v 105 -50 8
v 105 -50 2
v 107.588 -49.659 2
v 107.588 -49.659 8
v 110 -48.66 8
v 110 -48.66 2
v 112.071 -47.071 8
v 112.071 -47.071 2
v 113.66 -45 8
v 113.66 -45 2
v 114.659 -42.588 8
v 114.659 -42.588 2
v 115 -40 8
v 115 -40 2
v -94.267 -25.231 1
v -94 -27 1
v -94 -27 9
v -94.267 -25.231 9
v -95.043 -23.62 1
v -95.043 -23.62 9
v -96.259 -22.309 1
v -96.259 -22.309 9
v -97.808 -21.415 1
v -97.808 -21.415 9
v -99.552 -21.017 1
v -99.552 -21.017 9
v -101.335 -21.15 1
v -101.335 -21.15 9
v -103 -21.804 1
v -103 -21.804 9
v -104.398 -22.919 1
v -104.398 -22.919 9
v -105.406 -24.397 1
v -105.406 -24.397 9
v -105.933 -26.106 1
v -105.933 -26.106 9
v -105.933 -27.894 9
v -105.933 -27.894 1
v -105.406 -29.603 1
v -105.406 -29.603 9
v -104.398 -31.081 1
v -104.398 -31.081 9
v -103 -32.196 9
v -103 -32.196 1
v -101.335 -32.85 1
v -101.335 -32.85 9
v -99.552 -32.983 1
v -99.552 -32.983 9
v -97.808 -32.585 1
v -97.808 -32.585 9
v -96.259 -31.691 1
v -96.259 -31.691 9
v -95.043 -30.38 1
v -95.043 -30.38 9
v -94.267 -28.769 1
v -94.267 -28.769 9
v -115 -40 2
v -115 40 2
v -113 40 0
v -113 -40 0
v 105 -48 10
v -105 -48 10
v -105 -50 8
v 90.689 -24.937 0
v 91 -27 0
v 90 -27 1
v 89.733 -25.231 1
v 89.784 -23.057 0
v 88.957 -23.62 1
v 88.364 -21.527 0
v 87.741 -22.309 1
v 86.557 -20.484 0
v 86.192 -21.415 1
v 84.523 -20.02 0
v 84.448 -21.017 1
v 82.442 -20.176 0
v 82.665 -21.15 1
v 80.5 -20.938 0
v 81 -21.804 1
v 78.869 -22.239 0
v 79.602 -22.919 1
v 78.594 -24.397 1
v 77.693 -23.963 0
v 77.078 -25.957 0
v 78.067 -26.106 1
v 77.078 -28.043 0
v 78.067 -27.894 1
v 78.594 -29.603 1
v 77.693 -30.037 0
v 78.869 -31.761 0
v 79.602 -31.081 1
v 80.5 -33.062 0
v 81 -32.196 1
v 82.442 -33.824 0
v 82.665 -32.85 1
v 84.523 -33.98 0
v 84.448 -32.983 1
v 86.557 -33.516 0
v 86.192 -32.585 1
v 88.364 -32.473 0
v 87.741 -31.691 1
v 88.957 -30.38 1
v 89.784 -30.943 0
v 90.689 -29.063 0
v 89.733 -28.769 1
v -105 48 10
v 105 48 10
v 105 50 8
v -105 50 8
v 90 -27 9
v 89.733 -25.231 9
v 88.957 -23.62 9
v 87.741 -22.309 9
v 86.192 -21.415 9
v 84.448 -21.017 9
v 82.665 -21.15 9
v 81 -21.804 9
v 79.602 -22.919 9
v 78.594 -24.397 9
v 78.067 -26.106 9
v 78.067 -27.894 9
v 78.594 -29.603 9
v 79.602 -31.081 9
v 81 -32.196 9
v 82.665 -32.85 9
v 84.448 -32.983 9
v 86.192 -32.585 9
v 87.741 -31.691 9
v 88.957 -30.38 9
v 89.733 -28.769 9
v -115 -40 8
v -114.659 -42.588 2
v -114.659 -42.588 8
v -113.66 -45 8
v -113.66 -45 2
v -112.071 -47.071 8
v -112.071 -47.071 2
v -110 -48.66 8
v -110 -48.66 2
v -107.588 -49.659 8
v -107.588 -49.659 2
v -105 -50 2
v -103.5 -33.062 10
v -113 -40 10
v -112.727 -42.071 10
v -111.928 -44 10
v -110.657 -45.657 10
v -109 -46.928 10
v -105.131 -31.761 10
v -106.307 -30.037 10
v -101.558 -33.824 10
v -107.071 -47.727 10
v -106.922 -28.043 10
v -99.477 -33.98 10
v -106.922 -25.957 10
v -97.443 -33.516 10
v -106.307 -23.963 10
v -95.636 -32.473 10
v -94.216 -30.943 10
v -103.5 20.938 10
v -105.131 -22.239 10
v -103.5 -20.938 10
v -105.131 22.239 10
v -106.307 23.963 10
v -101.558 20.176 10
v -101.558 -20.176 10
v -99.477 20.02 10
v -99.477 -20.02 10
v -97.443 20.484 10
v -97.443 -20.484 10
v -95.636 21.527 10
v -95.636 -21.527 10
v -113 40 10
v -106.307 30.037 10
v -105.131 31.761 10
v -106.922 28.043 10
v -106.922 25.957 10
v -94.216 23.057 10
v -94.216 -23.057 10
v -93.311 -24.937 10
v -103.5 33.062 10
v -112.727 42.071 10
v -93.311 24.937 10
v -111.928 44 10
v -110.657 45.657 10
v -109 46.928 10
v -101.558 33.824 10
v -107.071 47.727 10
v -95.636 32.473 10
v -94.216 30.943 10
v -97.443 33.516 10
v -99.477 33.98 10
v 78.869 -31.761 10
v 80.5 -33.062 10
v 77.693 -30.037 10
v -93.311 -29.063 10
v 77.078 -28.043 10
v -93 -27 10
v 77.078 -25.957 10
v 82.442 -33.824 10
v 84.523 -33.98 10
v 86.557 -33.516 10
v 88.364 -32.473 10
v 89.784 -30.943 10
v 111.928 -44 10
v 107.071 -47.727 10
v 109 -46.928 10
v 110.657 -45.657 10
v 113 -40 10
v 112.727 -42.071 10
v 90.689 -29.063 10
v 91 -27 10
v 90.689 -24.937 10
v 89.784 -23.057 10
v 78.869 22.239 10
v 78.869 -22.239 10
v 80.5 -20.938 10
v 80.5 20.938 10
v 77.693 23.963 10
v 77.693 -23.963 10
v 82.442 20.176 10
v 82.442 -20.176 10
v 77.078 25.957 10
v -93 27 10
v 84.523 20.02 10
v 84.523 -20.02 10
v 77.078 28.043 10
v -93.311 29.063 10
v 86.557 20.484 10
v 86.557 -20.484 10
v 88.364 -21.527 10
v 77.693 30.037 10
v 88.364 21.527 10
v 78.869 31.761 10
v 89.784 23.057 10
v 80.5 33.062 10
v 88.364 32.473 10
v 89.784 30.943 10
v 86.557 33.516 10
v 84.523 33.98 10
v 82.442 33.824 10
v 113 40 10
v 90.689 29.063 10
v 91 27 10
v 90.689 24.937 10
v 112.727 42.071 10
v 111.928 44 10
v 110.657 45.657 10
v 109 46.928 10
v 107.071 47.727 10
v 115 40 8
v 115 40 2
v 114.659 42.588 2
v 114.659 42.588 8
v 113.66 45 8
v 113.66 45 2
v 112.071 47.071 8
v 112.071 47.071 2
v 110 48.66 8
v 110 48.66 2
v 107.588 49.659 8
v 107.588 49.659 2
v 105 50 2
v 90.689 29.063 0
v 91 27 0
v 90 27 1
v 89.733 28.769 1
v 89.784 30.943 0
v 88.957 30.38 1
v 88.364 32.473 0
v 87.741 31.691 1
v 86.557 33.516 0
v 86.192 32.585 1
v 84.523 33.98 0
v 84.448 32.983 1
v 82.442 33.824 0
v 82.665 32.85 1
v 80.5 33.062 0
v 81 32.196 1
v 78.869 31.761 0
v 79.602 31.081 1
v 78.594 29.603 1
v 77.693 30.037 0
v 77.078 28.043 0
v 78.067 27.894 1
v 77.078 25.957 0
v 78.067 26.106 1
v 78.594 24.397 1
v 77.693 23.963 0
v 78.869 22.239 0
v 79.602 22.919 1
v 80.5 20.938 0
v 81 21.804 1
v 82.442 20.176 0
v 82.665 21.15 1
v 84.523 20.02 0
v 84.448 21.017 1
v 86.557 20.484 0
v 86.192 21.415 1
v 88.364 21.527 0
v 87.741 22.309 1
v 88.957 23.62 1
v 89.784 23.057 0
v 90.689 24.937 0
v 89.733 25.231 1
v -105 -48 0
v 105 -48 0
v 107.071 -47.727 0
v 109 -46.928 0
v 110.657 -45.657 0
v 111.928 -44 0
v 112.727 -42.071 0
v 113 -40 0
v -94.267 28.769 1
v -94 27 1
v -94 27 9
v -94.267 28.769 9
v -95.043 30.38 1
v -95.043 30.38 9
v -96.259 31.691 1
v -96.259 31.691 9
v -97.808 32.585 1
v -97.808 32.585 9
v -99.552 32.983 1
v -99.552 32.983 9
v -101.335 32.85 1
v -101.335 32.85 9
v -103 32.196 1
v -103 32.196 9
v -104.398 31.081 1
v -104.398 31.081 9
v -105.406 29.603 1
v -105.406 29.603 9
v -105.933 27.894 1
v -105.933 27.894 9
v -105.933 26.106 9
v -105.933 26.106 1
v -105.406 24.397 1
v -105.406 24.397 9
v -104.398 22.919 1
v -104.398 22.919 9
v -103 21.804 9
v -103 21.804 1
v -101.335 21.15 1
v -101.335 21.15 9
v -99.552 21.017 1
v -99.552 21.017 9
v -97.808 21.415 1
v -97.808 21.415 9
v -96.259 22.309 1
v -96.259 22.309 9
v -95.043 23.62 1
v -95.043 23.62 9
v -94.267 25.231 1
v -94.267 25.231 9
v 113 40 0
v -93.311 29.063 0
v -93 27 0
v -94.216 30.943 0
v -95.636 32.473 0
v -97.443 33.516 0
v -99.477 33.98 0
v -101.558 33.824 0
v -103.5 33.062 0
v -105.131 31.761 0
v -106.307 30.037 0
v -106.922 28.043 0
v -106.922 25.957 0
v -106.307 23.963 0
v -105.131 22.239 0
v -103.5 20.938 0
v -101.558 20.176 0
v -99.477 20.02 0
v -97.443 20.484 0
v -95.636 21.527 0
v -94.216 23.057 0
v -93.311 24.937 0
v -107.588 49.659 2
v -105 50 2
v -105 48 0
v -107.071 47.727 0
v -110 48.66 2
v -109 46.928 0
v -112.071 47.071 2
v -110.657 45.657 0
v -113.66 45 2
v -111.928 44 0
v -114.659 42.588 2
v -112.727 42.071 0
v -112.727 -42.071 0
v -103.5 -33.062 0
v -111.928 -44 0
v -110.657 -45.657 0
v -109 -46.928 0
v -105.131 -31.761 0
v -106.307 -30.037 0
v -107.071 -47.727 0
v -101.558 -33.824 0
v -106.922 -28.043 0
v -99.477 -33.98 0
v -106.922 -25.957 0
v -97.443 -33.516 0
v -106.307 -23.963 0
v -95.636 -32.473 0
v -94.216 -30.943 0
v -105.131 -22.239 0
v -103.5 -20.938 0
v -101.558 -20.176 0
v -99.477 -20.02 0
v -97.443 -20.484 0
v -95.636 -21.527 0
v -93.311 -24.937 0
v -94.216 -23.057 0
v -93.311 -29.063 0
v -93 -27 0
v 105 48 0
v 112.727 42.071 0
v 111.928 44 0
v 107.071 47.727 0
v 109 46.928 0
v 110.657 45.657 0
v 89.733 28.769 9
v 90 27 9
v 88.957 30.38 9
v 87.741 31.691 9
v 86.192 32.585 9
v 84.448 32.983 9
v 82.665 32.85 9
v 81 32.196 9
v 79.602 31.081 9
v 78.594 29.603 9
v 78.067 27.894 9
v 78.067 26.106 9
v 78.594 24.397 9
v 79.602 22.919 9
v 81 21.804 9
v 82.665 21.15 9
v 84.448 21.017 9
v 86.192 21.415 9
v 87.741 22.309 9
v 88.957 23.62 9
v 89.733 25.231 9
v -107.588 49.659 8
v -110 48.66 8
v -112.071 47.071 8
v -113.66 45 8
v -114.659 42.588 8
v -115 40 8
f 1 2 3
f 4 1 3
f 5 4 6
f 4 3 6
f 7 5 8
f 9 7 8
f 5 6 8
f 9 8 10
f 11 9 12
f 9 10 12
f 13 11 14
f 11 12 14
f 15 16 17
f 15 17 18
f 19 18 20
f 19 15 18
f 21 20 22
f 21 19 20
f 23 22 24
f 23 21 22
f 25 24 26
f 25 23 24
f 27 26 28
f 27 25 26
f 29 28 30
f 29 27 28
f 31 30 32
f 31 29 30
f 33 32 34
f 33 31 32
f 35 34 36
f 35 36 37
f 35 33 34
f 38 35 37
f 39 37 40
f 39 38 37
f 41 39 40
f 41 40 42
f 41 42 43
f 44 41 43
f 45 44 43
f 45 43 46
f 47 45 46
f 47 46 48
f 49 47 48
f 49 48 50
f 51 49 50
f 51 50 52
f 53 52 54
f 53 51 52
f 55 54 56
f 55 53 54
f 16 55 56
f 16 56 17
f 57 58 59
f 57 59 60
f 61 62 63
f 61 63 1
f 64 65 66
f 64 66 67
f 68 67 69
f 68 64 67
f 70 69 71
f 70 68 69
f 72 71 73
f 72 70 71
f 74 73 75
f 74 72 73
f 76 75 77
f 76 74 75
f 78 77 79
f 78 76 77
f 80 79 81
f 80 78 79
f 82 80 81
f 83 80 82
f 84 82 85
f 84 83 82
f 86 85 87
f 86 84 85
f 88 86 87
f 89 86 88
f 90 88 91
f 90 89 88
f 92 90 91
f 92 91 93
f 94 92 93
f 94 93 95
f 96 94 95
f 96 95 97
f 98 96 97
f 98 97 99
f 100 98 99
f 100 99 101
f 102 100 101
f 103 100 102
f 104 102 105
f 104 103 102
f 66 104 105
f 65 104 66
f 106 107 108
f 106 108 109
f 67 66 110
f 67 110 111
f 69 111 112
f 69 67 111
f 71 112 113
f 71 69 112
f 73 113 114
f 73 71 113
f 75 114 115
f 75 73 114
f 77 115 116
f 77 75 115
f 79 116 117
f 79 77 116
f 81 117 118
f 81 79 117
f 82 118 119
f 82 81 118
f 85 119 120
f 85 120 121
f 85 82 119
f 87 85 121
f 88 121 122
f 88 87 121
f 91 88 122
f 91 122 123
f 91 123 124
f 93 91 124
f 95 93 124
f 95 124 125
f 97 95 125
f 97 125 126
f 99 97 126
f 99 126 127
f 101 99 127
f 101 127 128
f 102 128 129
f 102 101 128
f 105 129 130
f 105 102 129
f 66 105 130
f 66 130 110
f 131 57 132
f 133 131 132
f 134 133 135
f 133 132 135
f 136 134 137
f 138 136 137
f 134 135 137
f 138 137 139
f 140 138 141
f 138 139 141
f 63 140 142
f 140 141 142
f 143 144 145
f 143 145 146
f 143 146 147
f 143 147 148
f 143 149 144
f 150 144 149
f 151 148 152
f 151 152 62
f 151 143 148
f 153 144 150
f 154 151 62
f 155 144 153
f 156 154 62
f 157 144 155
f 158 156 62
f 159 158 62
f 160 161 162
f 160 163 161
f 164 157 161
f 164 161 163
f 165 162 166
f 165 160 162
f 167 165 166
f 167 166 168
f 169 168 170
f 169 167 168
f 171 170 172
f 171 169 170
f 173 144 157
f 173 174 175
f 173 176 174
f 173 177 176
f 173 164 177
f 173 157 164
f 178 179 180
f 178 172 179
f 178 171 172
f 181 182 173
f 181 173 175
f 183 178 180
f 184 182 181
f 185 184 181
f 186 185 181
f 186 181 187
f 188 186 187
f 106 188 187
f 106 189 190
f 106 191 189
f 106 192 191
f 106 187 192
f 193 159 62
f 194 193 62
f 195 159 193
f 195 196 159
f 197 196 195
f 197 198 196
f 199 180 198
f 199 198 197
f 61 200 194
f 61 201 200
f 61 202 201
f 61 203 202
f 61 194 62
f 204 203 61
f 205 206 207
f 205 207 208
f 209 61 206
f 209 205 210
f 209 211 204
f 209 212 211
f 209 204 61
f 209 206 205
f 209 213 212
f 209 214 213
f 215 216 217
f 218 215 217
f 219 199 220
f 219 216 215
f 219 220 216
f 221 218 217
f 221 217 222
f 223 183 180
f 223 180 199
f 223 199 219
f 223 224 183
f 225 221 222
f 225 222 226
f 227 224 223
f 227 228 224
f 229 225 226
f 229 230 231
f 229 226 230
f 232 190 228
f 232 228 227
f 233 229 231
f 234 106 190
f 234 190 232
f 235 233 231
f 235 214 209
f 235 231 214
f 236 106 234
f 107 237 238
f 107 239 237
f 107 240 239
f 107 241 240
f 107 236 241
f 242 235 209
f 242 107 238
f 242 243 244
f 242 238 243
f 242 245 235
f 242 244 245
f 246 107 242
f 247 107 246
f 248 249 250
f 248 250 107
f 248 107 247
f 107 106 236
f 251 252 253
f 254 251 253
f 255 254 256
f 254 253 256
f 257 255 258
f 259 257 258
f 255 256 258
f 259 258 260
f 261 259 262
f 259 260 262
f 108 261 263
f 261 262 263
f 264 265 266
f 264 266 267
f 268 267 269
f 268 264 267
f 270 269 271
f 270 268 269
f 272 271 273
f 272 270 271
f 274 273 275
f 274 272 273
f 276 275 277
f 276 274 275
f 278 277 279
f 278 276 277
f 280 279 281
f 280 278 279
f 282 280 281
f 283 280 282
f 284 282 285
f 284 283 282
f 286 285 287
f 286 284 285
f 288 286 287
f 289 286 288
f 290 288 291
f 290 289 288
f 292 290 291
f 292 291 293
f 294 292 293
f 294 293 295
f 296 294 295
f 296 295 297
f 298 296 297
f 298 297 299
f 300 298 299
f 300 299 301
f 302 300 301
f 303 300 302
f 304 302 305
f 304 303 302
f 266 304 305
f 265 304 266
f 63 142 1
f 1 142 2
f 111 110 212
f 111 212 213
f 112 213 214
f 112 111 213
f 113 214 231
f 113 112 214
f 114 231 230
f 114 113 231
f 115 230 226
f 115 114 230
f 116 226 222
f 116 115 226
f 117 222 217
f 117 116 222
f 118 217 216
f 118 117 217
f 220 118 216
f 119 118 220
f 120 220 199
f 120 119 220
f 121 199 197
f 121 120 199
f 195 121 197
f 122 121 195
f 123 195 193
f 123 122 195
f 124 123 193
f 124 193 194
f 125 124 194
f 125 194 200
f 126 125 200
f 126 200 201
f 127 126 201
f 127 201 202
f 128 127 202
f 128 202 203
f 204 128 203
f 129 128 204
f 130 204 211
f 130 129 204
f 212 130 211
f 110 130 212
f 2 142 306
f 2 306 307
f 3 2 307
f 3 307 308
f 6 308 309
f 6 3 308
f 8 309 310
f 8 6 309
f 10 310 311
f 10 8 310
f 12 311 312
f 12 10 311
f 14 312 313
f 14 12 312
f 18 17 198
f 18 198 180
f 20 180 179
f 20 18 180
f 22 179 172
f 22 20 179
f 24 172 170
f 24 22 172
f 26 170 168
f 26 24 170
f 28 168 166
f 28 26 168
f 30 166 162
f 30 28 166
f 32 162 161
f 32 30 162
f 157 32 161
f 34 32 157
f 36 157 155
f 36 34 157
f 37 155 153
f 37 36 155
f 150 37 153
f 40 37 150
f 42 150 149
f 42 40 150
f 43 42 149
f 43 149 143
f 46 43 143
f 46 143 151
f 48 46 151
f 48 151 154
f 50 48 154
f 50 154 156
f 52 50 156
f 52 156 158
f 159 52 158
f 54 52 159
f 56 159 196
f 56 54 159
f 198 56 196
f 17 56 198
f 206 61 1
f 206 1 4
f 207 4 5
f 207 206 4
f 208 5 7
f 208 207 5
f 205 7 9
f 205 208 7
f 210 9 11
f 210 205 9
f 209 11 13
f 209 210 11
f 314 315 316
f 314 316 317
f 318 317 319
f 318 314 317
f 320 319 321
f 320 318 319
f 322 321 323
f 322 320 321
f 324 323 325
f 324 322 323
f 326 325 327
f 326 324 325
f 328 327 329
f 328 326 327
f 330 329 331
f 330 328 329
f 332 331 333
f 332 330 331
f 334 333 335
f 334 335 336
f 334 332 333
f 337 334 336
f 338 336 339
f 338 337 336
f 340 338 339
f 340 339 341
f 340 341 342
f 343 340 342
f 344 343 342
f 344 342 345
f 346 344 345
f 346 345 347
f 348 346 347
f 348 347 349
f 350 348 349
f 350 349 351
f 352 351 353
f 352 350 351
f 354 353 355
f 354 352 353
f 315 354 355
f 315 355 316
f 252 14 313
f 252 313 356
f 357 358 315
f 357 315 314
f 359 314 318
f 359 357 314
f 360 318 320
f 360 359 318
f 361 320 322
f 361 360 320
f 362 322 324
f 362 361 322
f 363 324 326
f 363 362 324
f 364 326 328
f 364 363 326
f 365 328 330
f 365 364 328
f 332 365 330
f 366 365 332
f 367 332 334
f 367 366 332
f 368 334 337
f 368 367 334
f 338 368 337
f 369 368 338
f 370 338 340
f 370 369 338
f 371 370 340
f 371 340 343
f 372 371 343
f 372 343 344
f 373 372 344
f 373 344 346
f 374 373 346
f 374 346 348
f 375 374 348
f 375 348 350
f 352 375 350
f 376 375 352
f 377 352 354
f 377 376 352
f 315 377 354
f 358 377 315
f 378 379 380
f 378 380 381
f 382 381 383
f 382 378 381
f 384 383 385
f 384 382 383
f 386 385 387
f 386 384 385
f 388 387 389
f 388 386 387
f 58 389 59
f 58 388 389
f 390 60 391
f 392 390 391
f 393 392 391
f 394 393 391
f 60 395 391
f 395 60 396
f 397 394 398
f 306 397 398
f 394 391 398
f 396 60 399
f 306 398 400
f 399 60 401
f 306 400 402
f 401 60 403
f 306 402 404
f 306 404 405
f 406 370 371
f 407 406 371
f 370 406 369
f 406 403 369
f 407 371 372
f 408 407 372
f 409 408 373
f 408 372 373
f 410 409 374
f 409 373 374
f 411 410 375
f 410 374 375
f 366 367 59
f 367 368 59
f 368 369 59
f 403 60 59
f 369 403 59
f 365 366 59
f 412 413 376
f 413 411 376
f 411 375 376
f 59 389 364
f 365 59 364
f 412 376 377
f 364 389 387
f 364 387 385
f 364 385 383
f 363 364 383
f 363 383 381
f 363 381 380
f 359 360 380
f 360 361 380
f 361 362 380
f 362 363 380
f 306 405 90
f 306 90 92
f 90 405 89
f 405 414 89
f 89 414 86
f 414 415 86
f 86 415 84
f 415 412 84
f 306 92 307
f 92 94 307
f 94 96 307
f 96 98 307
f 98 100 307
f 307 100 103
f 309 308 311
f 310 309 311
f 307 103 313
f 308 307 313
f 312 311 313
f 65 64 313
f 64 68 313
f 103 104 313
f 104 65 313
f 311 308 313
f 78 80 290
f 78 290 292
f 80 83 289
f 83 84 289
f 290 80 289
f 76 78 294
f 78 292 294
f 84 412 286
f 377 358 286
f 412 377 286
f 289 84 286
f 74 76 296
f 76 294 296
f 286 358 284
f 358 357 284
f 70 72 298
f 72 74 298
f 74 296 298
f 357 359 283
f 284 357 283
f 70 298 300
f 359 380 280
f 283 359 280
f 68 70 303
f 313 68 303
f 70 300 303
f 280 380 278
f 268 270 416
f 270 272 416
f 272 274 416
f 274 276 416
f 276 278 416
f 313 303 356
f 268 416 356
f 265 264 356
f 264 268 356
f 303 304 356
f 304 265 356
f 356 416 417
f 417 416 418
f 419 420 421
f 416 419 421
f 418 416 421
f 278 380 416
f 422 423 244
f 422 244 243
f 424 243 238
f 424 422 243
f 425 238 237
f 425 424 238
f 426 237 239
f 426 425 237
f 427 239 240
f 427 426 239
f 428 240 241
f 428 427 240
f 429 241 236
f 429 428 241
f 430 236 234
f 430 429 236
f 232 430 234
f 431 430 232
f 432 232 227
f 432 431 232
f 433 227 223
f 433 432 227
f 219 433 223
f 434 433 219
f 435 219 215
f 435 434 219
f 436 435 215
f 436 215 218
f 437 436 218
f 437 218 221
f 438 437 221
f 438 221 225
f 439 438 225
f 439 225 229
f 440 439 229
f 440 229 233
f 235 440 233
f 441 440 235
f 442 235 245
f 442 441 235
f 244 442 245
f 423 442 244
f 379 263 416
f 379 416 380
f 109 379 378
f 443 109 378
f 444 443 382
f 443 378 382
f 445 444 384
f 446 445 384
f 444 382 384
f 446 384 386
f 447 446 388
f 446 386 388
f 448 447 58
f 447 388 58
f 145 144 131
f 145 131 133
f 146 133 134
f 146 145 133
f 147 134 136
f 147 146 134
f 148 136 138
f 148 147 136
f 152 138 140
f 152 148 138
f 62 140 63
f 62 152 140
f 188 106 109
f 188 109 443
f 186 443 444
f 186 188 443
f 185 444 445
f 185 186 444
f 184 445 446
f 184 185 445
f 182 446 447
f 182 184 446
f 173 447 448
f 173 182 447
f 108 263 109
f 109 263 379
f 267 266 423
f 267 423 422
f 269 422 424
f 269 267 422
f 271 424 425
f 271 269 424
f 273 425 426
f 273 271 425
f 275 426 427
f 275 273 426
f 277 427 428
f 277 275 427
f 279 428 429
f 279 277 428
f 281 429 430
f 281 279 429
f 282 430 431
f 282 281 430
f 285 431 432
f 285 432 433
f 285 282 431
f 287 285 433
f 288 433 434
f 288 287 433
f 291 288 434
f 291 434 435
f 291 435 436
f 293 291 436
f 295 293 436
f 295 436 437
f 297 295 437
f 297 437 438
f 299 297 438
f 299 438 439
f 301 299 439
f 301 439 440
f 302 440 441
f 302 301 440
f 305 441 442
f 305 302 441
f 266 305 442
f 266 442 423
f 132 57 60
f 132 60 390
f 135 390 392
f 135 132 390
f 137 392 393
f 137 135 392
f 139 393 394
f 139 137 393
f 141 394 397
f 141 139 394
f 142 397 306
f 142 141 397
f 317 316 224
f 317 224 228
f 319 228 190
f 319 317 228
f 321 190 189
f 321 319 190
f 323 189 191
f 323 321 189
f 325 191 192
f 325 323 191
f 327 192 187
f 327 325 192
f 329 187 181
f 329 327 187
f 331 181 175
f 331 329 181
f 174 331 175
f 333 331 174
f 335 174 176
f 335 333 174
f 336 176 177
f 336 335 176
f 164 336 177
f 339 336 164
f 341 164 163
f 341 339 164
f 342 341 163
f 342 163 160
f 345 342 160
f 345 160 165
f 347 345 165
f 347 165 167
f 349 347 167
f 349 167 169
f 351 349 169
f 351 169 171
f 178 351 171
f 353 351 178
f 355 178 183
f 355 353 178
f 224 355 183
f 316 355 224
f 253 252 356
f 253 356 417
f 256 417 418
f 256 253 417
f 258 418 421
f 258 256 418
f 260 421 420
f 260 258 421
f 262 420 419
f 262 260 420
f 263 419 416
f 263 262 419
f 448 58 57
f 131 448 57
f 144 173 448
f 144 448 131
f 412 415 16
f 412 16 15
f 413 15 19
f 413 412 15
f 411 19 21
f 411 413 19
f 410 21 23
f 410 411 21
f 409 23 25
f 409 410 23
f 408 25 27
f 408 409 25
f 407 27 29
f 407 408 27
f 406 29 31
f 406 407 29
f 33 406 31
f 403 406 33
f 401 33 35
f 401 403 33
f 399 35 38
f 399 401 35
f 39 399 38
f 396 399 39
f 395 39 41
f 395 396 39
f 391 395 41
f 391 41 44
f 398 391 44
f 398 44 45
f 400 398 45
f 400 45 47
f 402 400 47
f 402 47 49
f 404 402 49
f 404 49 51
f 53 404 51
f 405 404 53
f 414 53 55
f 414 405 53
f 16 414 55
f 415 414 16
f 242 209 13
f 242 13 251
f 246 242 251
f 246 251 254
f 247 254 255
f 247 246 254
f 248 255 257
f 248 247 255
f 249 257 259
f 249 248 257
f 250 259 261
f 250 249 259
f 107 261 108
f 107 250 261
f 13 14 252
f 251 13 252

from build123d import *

# Parameters (mm, degrees)
F0_R     = 6
F1_DEPTH = 10
F2_SIZE  = 2
F3_SIZE  = 2
F4_SIZE  = 1
F5_SIZE  = 1


with BuildPart() as f1:
    # F0 (on Top) → F1 (new body)
    with BuildSketch(Plane.XY):
        with BuildLine():
            ThreePointArc((115, 40), (112.071068, 47.071068), (105, 50))
            Line((105, 50), (-105, 50))
            ThreePointArc((-105, 50), (-112.071068, 47.071068), (-115, 40))
            Line((-115, 40), (-115, -40))
            ThreePointArc((-115, -40), (-112.071068, -47.071068), (-105, -50))
            Line((-105, -50), (105, -50))
            ThreePointArc((105, -50), (112.071068, -47.071068), (115, -40))
            Line((115, -40), (115, 40))
        make_face()
        with Locations((-100, -27)):
            Circle(F0_R, mode=Mode.SUBTRACT)
        with Locations((84, -27)):
            Circle(F0_R, mode=Mode.SUBTRACT)
        with Locations((-100, 27)):
            Circle(F0_R, mode=Mode.SUBTRACT)
        with Locations((84, 27)):
            Circle(F0_R, mode=Mode.SUBTRACT)
    extrude(amount=F1_DEPTH)

    # F2
    f2_edges = [f1.edges().sort_by_distance(p)[0] for p in [
        (0, -50, 10),
    ]]
    chamfer(f2_edges, length=F2_SIZE)

    # F3
    f3_edges = [f1.edges().sort_by_distance(p)[0] for p in [
        (0, -50, 0),
    ]]
    chamfer(f3_edges, length=F3_SIZE)

    # F4
    f4_edges = [f1.edges().sort_by_distance(p)[0] for p in [
        (-106, -27, 10),
        (-106, 27, 10),
        (78, 27, 10),
        (78, -27, 10),
    ]]
    chamfer(f4_edges, length=F4_SIZE)

    # F5
    f5_edges = [f1.edges().sort_by_distance(p)[0] for p in [
        (78, -27, 0),
        (78, 27, 0),
        (-106, -27, 0),
        (-106, 27, 0),
    ]]
    chamfer(f5_edges, length=F5_SIZE)


solid = f1.part
